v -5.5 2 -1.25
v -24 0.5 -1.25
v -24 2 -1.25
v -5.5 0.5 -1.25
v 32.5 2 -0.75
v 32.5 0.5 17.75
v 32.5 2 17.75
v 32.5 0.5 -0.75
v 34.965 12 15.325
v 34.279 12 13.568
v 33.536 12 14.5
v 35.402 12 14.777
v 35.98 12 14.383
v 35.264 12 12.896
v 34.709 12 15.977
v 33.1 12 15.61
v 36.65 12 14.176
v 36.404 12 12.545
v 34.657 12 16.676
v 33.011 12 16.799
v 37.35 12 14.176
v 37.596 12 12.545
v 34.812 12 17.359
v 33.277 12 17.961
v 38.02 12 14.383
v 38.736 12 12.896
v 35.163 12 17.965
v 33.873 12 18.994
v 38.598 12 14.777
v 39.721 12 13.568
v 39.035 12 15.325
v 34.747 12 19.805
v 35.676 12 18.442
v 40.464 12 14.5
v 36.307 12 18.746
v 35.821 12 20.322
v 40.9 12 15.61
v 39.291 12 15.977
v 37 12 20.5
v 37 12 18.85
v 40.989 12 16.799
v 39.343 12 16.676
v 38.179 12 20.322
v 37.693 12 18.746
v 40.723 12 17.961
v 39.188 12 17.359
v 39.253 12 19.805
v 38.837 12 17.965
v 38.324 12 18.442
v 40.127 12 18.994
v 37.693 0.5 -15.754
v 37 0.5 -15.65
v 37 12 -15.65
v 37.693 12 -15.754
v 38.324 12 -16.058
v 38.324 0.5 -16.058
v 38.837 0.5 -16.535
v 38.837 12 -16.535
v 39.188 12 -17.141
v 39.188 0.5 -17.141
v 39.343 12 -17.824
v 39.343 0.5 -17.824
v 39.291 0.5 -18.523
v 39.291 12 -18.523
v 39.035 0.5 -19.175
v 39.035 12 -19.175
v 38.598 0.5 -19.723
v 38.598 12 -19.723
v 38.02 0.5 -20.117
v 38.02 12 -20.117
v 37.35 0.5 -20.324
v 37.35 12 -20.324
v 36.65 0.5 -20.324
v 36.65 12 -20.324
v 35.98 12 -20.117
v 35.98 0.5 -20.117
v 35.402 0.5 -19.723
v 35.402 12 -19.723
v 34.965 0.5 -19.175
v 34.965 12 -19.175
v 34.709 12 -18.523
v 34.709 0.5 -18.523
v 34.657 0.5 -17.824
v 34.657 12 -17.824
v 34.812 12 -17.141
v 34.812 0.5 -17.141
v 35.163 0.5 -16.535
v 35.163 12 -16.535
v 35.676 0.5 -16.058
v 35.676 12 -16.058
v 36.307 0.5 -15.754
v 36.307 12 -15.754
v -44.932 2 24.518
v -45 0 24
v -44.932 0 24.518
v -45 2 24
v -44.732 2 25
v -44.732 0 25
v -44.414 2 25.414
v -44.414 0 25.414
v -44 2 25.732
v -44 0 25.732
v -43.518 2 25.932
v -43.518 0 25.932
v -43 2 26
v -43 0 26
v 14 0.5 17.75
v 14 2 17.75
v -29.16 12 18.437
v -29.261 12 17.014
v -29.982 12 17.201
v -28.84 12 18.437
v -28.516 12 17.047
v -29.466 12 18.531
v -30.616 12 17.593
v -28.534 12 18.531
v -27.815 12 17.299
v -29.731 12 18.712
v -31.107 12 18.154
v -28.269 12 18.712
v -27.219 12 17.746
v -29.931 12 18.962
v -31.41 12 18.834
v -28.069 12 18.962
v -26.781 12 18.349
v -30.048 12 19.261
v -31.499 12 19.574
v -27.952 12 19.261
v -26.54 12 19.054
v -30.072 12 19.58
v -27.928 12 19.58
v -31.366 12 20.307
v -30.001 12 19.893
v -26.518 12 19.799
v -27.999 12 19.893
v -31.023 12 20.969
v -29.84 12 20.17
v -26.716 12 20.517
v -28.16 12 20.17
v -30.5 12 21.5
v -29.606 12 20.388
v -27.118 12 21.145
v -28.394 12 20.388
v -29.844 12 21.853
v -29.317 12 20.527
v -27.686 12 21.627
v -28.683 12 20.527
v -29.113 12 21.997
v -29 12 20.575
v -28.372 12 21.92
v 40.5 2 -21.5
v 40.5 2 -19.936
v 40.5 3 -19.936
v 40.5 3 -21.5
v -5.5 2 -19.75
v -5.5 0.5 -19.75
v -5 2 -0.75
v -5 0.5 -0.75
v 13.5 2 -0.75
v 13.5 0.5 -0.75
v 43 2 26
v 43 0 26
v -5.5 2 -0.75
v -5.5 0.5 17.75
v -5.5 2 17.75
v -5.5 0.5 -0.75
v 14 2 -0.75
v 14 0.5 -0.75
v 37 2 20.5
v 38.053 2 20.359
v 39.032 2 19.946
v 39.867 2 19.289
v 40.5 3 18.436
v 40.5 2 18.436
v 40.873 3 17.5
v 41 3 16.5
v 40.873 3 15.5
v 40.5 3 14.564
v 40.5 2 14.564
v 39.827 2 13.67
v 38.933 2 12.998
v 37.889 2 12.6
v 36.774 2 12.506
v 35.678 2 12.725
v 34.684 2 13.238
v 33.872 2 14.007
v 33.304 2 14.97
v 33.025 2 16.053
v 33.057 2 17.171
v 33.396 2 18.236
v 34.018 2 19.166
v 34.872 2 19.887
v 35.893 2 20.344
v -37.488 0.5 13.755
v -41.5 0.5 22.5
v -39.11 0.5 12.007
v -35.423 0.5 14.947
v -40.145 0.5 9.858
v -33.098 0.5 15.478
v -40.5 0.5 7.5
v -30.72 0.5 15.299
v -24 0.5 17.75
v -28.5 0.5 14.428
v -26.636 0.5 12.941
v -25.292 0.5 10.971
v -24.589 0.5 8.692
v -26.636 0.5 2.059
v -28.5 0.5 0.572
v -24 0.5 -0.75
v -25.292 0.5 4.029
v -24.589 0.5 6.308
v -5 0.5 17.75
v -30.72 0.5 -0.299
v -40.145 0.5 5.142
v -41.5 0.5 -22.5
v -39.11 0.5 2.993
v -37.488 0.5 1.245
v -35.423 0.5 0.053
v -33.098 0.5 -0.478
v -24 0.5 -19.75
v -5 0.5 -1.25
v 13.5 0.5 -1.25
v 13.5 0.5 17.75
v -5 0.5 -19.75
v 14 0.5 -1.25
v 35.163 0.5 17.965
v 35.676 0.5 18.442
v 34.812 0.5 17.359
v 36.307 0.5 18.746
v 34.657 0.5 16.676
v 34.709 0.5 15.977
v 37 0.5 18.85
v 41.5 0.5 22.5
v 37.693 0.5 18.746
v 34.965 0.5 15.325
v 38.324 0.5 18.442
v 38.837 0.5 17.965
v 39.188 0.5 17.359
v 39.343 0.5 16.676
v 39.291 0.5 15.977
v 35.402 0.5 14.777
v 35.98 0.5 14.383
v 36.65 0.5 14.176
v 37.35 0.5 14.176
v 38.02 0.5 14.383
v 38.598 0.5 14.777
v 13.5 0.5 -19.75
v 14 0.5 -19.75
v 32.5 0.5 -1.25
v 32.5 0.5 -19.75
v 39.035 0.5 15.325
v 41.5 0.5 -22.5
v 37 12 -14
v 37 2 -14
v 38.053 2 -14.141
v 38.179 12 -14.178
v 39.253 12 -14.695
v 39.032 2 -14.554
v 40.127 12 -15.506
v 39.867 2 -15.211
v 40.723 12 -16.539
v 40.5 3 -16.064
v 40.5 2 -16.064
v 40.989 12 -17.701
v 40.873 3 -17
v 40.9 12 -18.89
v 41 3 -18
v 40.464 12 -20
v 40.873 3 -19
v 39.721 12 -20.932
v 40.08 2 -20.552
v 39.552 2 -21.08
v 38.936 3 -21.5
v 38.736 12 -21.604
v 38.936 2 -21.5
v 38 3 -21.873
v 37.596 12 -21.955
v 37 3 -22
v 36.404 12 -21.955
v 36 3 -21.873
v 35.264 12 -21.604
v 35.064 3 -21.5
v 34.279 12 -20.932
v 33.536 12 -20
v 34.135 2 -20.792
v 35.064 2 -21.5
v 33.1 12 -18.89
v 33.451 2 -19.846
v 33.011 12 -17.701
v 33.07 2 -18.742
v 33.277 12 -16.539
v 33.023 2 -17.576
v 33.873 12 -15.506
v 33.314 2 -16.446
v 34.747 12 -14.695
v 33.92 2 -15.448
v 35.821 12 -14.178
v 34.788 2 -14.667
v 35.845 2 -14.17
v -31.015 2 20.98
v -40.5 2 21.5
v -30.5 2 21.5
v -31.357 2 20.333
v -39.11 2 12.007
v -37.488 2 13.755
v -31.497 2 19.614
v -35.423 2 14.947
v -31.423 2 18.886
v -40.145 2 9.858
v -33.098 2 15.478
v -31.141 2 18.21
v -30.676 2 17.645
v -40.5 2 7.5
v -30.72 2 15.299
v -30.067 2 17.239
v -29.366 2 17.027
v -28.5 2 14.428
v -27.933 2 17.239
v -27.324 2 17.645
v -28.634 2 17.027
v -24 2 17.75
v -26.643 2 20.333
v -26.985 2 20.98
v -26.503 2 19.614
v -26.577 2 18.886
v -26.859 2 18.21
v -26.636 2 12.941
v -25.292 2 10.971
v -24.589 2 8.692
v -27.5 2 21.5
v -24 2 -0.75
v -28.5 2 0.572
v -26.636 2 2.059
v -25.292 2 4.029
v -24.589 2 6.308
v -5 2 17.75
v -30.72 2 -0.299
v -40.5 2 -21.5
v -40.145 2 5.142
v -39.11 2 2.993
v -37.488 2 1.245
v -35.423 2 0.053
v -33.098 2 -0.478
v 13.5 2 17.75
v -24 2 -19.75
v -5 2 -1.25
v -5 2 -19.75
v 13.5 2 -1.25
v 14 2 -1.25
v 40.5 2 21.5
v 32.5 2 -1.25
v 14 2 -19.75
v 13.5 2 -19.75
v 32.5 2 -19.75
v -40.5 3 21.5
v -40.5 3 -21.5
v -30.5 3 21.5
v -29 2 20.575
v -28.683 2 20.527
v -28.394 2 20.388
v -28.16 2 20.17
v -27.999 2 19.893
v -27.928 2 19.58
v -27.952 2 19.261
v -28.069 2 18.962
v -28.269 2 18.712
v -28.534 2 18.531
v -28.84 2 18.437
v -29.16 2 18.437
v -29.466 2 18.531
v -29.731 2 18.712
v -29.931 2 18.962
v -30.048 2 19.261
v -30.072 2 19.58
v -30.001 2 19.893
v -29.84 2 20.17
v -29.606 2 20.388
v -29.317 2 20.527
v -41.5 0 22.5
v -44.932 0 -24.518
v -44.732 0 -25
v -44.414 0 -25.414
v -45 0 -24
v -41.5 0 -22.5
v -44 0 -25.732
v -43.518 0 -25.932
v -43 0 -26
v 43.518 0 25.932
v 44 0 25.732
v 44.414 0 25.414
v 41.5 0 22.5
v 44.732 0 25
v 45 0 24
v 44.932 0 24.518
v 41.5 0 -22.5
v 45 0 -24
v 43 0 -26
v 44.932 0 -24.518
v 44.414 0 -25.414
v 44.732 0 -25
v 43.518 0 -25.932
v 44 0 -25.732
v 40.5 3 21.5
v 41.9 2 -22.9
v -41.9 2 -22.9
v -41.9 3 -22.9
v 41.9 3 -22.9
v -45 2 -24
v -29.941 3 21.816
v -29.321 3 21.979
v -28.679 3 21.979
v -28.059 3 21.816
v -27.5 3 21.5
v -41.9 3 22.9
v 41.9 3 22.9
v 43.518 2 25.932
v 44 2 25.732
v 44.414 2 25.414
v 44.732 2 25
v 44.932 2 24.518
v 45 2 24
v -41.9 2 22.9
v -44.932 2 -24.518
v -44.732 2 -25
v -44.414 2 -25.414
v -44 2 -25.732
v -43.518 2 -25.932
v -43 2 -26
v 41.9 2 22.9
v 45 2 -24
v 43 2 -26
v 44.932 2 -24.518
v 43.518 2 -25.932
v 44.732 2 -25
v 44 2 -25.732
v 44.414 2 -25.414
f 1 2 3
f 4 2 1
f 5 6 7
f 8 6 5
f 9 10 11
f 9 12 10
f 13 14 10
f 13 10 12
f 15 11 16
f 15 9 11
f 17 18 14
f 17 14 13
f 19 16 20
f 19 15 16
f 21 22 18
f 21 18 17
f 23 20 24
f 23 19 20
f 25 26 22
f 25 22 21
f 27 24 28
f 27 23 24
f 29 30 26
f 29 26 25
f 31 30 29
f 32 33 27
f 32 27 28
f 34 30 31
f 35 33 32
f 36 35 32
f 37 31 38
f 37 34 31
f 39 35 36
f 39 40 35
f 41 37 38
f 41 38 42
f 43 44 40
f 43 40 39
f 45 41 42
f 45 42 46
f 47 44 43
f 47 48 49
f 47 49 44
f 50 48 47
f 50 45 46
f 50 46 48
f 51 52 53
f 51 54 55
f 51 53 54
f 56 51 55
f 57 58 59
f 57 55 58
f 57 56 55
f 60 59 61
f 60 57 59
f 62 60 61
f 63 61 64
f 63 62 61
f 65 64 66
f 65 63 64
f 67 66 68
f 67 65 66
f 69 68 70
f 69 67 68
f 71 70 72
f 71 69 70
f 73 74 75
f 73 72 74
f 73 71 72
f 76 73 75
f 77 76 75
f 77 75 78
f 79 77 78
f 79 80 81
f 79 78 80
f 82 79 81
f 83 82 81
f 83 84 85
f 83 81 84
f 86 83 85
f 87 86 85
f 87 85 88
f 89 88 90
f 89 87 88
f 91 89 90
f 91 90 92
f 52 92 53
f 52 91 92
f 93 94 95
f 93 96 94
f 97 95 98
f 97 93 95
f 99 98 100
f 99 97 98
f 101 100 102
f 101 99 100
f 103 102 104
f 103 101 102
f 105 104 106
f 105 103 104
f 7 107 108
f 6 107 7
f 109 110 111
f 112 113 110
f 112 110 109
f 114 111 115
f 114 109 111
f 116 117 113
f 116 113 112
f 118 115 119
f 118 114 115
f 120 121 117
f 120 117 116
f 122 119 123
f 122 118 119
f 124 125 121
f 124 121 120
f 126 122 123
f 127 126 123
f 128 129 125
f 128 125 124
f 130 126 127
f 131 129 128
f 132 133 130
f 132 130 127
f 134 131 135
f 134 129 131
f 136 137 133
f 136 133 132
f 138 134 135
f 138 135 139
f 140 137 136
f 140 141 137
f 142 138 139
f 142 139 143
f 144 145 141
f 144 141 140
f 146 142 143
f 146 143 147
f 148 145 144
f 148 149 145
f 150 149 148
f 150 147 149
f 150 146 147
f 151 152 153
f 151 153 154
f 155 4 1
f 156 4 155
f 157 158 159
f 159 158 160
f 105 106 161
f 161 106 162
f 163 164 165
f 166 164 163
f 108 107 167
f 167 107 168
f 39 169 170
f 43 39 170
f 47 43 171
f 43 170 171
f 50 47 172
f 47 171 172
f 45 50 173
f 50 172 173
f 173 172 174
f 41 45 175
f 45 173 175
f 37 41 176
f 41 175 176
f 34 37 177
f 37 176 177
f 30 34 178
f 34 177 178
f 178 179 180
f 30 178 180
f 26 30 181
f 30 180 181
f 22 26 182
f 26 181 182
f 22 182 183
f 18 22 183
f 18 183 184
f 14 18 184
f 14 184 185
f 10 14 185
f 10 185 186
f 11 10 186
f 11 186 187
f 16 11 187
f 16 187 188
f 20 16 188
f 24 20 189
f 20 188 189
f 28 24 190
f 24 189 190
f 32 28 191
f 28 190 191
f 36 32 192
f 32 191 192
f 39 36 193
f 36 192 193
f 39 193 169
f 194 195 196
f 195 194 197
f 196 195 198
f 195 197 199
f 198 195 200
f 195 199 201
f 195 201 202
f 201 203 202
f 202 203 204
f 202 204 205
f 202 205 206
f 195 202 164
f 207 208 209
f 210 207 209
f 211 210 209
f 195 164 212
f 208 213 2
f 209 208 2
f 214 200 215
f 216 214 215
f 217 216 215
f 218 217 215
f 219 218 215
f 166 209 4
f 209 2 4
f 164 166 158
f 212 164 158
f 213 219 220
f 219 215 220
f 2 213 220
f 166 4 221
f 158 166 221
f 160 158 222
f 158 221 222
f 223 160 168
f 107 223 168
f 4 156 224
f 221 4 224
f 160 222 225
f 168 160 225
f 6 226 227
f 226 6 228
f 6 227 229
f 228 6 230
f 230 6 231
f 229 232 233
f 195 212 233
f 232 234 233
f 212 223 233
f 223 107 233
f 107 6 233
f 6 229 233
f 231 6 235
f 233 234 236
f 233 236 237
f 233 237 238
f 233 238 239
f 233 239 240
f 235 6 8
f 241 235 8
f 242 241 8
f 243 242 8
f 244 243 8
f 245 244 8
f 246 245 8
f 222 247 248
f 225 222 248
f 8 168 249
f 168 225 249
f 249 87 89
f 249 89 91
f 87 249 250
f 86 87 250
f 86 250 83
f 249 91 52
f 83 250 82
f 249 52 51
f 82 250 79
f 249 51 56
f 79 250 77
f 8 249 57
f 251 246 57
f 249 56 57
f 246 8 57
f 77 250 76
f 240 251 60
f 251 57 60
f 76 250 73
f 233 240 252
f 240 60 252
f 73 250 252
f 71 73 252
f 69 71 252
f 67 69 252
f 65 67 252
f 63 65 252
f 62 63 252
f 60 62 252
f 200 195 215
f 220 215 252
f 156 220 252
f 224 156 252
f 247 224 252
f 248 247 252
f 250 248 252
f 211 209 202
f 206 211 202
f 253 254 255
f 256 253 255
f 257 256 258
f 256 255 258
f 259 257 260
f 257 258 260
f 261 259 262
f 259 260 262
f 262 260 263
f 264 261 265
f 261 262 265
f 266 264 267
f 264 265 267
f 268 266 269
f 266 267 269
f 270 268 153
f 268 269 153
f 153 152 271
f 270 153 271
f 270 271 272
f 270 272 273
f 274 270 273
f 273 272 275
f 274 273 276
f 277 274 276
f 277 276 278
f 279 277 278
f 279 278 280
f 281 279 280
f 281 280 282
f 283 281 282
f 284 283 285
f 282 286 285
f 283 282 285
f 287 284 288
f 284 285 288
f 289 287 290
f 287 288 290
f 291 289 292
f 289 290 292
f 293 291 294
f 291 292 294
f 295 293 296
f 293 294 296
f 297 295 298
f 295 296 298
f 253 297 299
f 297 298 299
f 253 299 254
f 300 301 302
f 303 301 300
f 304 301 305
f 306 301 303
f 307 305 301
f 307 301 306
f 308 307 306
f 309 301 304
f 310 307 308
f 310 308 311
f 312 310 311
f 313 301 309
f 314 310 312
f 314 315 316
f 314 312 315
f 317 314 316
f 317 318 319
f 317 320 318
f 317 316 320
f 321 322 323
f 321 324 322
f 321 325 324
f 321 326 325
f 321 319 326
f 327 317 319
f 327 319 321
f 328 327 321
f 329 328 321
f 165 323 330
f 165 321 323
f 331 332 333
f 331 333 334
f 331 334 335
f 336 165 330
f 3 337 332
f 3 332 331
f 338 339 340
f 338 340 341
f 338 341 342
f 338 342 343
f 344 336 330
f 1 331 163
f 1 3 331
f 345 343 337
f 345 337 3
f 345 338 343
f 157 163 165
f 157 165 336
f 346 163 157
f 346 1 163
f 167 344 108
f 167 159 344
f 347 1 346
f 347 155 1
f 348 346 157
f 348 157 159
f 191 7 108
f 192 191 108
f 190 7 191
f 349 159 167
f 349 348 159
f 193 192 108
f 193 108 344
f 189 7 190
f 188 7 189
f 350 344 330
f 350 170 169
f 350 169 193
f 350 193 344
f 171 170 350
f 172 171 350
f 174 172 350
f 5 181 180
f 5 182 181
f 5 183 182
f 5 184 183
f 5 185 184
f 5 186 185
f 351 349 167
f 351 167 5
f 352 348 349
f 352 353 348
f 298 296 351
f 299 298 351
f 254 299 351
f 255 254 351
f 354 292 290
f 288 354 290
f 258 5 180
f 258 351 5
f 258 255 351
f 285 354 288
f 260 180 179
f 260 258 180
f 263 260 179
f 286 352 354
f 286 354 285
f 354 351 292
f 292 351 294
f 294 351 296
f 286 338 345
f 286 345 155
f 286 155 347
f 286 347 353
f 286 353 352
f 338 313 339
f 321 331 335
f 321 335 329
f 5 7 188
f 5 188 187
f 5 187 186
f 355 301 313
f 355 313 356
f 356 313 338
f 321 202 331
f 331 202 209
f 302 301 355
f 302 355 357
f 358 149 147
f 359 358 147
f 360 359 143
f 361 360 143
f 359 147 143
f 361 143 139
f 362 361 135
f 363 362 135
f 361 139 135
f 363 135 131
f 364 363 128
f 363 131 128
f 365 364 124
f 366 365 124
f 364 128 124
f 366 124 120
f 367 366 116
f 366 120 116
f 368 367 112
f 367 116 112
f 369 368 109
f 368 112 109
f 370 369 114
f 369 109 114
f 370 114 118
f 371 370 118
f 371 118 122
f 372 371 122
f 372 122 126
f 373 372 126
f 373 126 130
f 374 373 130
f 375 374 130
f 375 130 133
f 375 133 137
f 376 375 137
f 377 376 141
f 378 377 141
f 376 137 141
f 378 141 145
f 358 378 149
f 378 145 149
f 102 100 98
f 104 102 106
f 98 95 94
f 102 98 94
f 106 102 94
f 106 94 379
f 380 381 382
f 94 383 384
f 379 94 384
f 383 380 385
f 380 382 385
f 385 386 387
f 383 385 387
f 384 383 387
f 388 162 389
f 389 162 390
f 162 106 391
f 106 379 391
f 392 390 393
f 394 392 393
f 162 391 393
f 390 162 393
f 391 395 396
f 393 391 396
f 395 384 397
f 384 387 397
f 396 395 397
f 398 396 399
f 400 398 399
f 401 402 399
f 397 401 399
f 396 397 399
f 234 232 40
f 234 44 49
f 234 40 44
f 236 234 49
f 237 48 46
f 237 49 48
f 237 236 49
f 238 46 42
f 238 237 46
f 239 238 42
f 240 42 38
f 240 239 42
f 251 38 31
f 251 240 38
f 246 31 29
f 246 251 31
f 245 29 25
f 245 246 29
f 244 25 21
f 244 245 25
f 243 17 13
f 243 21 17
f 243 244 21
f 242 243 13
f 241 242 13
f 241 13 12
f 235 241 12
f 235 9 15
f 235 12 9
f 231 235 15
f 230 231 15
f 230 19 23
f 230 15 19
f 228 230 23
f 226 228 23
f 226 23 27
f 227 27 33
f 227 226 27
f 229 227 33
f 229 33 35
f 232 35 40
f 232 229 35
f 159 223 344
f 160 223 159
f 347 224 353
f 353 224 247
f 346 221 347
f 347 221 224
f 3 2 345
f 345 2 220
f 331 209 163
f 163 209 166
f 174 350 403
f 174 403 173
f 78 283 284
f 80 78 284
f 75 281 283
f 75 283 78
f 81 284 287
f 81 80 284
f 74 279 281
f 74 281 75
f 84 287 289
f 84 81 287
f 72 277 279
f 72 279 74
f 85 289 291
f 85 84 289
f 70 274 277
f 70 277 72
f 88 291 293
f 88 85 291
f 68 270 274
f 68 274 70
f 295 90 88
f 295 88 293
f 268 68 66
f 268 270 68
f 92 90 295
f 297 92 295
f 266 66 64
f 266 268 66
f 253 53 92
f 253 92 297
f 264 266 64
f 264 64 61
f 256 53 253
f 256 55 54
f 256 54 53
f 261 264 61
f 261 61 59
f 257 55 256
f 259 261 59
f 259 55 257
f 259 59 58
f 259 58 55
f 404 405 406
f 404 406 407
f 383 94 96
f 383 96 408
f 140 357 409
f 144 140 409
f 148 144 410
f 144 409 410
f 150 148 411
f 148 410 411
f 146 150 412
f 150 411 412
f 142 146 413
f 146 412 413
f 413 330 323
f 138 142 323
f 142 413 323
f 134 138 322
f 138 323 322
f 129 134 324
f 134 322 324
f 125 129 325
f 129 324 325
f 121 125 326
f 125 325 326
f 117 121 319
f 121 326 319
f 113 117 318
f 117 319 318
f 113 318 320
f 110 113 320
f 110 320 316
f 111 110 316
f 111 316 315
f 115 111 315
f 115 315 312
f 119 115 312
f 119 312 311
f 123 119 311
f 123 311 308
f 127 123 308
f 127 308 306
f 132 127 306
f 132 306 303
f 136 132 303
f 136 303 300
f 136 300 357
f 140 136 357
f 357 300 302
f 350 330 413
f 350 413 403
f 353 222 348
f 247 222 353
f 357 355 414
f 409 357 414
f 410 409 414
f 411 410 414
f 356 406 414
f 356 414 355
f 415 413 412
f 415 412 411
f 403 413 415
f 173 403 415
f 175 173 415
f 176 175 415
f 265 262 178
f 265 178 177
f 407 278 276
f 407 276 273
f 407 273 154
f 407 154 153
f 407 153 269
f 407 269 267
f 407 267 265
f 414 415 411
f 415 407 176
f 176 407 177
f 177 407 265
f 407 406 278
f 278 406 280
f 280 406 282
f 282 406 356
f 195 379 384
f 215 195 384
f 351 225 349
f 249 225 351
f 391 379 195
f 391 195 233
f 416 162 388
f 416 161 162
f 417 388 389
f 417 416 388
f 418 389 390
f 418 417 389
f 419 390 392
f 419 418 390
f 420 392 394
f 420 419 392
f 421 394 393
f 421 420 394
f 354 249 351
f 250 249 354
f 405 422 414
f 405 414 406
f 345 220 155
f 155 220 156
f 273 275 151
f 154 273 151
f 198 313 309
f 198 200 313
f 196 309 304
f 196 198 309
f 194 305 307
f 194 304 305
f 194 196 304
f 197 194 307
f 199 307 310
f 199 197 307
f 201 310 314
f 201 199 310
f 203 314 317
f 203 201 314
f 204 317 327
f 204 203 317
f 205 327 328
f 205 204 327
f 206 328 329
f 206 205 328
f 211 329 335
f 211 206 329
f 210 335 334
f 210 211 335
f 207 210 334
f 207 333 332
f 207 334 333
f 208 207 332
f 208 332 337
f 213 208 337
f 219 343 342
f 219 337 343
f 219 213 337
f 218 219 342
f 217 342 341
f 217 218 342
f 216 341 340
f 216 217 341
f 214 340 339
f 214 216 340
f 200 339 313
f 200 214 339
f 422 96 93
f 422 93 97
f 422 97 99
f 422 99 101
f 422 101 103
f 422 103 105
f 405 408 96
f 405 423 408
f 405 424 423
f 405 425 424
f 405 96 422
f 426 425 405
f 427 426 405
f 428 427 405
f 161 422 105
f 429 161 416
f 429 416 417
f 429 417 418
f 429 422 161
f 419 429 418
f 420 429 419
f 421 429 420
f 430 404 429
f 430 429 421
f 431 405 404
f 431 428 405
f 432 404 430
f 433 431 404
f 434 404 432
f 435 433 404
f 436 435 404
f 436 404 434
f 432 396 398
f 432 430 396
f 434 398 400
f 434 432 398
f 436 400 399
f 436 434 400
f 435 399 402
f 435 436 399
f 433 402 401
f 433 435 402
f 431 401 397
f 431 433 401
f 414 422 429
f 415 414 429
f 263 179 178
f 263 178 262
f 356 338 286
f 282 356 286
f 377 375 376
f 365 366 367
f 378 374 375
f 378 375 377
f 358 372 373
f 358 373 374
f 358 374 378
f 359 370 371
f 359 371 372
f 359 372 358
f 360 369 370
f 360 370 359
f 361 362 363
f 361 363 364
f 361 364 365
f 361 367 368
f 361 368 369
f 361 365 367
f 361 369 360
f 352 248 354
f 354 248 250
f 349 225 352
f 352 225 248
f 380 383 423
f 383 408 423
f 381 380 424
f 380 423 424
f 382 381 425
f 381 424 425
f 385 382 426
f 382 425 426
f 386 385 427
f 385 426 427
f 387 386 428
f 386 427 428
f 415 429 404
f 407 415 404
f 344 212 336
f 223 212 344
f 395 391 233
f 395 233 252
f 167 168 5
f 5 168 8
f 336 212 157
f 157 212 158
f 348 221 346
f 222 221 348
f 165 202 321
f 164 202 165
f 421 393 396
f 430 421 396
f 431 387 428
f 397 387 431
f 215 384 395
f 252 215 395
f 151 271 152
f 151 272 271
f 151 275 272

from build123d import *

# Parameters (mm, degrees)
SKETCH3_W               = 90
SKETCH3_H               = 52
BOSS_EXTRUDE2_DEPTH     = 2
FILLET2_R               = 2
BOSS_EXTRUDE3_START     = 2
SKETCH7_R               = 4
BOSS_EXTRUDE3_DEPTH     = 10
CUT_EXTRUDE2_DEPTH      = 54.338541412
CUT_EXTRUDE2_DEPTH_BACK = 4
CUT_EXTRUDE2_START      = 2
SKETCH8_R               = 2.35
BOSS_EXTRUDE4_START     = 2
SKETCH10_W              = 83.8
SKETCH10_H              = 45.8
SKETCH10_W_2            = 81
SKETCH10_H_2            = 43
BOSS_EXTRUDE4_DEPTH     = 1
BOSS_EXTRUDE5_START     = 2
SKETCH11_R              = 2.5
BOSS_EXTRUDE5_DEPTH     = 10
CUT_EXTRUDE3_START      = 12
SKETCH12_R              = 1.075
CUT_EXTRUDE3_DEPTH      = 10
SKETCH4_W               = 83
SKETCH4_H               = 45
CUT_EXTRUDE4_DEPTH      = 0.5
CUT_EXTRUDE5_DEPTH      = 54.338541412
CUT_EXTRUDE5_DEPTH_BACK = 54.338541412
SKETCH5_R               = 8
SKETCH5_W               = 18.5
SKETCH5_H               = 18.5


with BuildPart() as part:
    # Sketch3 → Boss-Extrude2 (new body)
    with BuildSketch(Plane(origin=(0, 0, 0), x_dir=(1, 0, 0), z_dir=(0, 1, 0))):
        Rectangle(SKETCH3_W, SKETCH3_H)
    extrude(amount=BOSS_EXTRUDE2_DEPTH)

    # Fillet2
    fillet2_edges = [part.edges().sort_by_distance(p)[0] for p in [
        (-45, 1, -26),
        (45, 1, -26),
        (45, 1, 26),
        (-45, 1, 26),
    ]]
    fillet(fillet2_edges, radius=FILLET2_R)

    # Sketch7 → Boss-Extrude3 (add)
    with BuildSketch(Plane(origin=(0, 0, 0), x_dir=(1, 0, 0), z_dir=(0, 1, 0)).offset(BOSS_EXTRUDE3_START)):
        with Locations(Location((37, 18, 0), (0, 0, 270))):
            Circle(SKETCH7_R)
        with Locations(Location((37, -16.5, 0), (0, 0, 270))):
            Circle(SKETCH7_R)
    extrude(amount=BOSS_EXTRUDE3_DEPTH)

    # Sketch8 → Cut-Extrude2 (cut, two sides: drawn at the far end of the back side and taken through both)
    with BuildSketch(Plane(origin=(0, 0, 0), x_dir=(1, 0, 0), z_dir=(0, 1, 0)).offset(CUT_EXTRUDE2_START - CUT_EXTRUDE2_DEPTH_BACK)):
        with Locations(Location((37, 18, 0), (0, 0, 270))):
            Circle(SKETCH8_R)
        with Locations(Location((37, -16.5, 0), (0, 0, 270))):
            Circle(SKETCH8_R)
    extrude(amount=CUT_EXTRUDE2_DEPTH + CUT_EXTRUDE2_DEPTH_BACK, mode=Mode.SUBTRACT)

    # Sketch10 → Boss-Extrude4 (add)
    with BuildSketch(Plane(origin=(0, 0, 0), x_dir=(1, 0, 0), z_dir=(0, 1, 0)).offset(BOSS_EXTRUDE4_START)):
        Rectangle(SKETCH10_W, SKETCH10_H)
        Rectangle(SKETCH10_W_2, SKETCH10_H_2, mode=Mode.SUBTRACT)
    extrude(amount=BOSS_EXTRUDE4_DEPTH)

    # Sketch11 → Boss-Extrude5 (add)
    with BuildSketch(Plane(origin=(0, 0, 0), x_dir=(1, 0, 0), z_dir=(0, 1, 0)).offset(BOSS_EXTRUDE5_START)):
        with Locations(Location((-29, -19.5, 0), (0, 0, 233.130102354))):
            Circle(SKETCH11_R)
    extrude(amount=BOSS_EXTRUDE5_DEPTH)

    # Sketch12 → Cut-Extrude3 (cut)
    with BuildSketch(Plane(origin=(0, 0, 0), x_dir=(1, 0, 0), z_dir=(0, 1, 0)).offset(CUT_EXTRUDE3_START)):
        with Locations(Location((-29, -19.5, 0), (0, 0, 270))):
            Circle(SKETCH12_R)
    extrude(amount=-CUT_EXTRUDE3_DEPTH, mode=Mode.SUBTRACT)

    # Sketch4 → Cut-Extrude4 (cut)
    with BuildSketch(Plane(origin=(0, 0, 0), x_dir=(1, 0, 0), z_dir=(0, 1, 0))):
        Rectangle(SKETCH4_W, SKETCH4_H)
    extrude(amount=CUT_EXTRUDE4_DEPTH, mode=Mode.SUBTRACT)

    # Sketch5 → Cut-Extrude5 (cut, two sides: drawn at the far end of the back side and taken through both)
    with BuildSketch(Plane(origin=(0, 0, 0), x_dir=(1, 0, 0), z_dir=(0, 1, 0)).offset(-CUT_EXTRUDE5_DEPTH_BACK)):
        with Locations(Location((-32.5, -7.5, 0), (0, 0, 180))):
            Circle(SKETCH5_R)
        with Locations((-14.75, 10.5)):
            Rectangle(SKETCH5_W, SKETCH5_H)
        with Locations((23.25, 10.5)):
            Rectangle(SKETCH5_W, SKETCH5_H)
        with Locations((-14.75, -8.5)):
            Rectangle(SKETCH5_W, SKETCH5_H)
        with Locations((23.25, -8.5)):
            Rectangle(SKETCH5_W, SKETCH5_H)
        with Locations((4.25, 10.5)):
            Rectangle(SKETCH5_W, SKETCH5_H)
        with Locations((4.25, -8.5)):
            Rectangle(SKETCH5_W, SKETCH5_H)
    extrude(amount=CUT_EXTRUDE5_DEPTH + CUT_EXTRUDE5_DEPTH_BACK, mode=Mode.SUBTRACT)


solid = part.part
